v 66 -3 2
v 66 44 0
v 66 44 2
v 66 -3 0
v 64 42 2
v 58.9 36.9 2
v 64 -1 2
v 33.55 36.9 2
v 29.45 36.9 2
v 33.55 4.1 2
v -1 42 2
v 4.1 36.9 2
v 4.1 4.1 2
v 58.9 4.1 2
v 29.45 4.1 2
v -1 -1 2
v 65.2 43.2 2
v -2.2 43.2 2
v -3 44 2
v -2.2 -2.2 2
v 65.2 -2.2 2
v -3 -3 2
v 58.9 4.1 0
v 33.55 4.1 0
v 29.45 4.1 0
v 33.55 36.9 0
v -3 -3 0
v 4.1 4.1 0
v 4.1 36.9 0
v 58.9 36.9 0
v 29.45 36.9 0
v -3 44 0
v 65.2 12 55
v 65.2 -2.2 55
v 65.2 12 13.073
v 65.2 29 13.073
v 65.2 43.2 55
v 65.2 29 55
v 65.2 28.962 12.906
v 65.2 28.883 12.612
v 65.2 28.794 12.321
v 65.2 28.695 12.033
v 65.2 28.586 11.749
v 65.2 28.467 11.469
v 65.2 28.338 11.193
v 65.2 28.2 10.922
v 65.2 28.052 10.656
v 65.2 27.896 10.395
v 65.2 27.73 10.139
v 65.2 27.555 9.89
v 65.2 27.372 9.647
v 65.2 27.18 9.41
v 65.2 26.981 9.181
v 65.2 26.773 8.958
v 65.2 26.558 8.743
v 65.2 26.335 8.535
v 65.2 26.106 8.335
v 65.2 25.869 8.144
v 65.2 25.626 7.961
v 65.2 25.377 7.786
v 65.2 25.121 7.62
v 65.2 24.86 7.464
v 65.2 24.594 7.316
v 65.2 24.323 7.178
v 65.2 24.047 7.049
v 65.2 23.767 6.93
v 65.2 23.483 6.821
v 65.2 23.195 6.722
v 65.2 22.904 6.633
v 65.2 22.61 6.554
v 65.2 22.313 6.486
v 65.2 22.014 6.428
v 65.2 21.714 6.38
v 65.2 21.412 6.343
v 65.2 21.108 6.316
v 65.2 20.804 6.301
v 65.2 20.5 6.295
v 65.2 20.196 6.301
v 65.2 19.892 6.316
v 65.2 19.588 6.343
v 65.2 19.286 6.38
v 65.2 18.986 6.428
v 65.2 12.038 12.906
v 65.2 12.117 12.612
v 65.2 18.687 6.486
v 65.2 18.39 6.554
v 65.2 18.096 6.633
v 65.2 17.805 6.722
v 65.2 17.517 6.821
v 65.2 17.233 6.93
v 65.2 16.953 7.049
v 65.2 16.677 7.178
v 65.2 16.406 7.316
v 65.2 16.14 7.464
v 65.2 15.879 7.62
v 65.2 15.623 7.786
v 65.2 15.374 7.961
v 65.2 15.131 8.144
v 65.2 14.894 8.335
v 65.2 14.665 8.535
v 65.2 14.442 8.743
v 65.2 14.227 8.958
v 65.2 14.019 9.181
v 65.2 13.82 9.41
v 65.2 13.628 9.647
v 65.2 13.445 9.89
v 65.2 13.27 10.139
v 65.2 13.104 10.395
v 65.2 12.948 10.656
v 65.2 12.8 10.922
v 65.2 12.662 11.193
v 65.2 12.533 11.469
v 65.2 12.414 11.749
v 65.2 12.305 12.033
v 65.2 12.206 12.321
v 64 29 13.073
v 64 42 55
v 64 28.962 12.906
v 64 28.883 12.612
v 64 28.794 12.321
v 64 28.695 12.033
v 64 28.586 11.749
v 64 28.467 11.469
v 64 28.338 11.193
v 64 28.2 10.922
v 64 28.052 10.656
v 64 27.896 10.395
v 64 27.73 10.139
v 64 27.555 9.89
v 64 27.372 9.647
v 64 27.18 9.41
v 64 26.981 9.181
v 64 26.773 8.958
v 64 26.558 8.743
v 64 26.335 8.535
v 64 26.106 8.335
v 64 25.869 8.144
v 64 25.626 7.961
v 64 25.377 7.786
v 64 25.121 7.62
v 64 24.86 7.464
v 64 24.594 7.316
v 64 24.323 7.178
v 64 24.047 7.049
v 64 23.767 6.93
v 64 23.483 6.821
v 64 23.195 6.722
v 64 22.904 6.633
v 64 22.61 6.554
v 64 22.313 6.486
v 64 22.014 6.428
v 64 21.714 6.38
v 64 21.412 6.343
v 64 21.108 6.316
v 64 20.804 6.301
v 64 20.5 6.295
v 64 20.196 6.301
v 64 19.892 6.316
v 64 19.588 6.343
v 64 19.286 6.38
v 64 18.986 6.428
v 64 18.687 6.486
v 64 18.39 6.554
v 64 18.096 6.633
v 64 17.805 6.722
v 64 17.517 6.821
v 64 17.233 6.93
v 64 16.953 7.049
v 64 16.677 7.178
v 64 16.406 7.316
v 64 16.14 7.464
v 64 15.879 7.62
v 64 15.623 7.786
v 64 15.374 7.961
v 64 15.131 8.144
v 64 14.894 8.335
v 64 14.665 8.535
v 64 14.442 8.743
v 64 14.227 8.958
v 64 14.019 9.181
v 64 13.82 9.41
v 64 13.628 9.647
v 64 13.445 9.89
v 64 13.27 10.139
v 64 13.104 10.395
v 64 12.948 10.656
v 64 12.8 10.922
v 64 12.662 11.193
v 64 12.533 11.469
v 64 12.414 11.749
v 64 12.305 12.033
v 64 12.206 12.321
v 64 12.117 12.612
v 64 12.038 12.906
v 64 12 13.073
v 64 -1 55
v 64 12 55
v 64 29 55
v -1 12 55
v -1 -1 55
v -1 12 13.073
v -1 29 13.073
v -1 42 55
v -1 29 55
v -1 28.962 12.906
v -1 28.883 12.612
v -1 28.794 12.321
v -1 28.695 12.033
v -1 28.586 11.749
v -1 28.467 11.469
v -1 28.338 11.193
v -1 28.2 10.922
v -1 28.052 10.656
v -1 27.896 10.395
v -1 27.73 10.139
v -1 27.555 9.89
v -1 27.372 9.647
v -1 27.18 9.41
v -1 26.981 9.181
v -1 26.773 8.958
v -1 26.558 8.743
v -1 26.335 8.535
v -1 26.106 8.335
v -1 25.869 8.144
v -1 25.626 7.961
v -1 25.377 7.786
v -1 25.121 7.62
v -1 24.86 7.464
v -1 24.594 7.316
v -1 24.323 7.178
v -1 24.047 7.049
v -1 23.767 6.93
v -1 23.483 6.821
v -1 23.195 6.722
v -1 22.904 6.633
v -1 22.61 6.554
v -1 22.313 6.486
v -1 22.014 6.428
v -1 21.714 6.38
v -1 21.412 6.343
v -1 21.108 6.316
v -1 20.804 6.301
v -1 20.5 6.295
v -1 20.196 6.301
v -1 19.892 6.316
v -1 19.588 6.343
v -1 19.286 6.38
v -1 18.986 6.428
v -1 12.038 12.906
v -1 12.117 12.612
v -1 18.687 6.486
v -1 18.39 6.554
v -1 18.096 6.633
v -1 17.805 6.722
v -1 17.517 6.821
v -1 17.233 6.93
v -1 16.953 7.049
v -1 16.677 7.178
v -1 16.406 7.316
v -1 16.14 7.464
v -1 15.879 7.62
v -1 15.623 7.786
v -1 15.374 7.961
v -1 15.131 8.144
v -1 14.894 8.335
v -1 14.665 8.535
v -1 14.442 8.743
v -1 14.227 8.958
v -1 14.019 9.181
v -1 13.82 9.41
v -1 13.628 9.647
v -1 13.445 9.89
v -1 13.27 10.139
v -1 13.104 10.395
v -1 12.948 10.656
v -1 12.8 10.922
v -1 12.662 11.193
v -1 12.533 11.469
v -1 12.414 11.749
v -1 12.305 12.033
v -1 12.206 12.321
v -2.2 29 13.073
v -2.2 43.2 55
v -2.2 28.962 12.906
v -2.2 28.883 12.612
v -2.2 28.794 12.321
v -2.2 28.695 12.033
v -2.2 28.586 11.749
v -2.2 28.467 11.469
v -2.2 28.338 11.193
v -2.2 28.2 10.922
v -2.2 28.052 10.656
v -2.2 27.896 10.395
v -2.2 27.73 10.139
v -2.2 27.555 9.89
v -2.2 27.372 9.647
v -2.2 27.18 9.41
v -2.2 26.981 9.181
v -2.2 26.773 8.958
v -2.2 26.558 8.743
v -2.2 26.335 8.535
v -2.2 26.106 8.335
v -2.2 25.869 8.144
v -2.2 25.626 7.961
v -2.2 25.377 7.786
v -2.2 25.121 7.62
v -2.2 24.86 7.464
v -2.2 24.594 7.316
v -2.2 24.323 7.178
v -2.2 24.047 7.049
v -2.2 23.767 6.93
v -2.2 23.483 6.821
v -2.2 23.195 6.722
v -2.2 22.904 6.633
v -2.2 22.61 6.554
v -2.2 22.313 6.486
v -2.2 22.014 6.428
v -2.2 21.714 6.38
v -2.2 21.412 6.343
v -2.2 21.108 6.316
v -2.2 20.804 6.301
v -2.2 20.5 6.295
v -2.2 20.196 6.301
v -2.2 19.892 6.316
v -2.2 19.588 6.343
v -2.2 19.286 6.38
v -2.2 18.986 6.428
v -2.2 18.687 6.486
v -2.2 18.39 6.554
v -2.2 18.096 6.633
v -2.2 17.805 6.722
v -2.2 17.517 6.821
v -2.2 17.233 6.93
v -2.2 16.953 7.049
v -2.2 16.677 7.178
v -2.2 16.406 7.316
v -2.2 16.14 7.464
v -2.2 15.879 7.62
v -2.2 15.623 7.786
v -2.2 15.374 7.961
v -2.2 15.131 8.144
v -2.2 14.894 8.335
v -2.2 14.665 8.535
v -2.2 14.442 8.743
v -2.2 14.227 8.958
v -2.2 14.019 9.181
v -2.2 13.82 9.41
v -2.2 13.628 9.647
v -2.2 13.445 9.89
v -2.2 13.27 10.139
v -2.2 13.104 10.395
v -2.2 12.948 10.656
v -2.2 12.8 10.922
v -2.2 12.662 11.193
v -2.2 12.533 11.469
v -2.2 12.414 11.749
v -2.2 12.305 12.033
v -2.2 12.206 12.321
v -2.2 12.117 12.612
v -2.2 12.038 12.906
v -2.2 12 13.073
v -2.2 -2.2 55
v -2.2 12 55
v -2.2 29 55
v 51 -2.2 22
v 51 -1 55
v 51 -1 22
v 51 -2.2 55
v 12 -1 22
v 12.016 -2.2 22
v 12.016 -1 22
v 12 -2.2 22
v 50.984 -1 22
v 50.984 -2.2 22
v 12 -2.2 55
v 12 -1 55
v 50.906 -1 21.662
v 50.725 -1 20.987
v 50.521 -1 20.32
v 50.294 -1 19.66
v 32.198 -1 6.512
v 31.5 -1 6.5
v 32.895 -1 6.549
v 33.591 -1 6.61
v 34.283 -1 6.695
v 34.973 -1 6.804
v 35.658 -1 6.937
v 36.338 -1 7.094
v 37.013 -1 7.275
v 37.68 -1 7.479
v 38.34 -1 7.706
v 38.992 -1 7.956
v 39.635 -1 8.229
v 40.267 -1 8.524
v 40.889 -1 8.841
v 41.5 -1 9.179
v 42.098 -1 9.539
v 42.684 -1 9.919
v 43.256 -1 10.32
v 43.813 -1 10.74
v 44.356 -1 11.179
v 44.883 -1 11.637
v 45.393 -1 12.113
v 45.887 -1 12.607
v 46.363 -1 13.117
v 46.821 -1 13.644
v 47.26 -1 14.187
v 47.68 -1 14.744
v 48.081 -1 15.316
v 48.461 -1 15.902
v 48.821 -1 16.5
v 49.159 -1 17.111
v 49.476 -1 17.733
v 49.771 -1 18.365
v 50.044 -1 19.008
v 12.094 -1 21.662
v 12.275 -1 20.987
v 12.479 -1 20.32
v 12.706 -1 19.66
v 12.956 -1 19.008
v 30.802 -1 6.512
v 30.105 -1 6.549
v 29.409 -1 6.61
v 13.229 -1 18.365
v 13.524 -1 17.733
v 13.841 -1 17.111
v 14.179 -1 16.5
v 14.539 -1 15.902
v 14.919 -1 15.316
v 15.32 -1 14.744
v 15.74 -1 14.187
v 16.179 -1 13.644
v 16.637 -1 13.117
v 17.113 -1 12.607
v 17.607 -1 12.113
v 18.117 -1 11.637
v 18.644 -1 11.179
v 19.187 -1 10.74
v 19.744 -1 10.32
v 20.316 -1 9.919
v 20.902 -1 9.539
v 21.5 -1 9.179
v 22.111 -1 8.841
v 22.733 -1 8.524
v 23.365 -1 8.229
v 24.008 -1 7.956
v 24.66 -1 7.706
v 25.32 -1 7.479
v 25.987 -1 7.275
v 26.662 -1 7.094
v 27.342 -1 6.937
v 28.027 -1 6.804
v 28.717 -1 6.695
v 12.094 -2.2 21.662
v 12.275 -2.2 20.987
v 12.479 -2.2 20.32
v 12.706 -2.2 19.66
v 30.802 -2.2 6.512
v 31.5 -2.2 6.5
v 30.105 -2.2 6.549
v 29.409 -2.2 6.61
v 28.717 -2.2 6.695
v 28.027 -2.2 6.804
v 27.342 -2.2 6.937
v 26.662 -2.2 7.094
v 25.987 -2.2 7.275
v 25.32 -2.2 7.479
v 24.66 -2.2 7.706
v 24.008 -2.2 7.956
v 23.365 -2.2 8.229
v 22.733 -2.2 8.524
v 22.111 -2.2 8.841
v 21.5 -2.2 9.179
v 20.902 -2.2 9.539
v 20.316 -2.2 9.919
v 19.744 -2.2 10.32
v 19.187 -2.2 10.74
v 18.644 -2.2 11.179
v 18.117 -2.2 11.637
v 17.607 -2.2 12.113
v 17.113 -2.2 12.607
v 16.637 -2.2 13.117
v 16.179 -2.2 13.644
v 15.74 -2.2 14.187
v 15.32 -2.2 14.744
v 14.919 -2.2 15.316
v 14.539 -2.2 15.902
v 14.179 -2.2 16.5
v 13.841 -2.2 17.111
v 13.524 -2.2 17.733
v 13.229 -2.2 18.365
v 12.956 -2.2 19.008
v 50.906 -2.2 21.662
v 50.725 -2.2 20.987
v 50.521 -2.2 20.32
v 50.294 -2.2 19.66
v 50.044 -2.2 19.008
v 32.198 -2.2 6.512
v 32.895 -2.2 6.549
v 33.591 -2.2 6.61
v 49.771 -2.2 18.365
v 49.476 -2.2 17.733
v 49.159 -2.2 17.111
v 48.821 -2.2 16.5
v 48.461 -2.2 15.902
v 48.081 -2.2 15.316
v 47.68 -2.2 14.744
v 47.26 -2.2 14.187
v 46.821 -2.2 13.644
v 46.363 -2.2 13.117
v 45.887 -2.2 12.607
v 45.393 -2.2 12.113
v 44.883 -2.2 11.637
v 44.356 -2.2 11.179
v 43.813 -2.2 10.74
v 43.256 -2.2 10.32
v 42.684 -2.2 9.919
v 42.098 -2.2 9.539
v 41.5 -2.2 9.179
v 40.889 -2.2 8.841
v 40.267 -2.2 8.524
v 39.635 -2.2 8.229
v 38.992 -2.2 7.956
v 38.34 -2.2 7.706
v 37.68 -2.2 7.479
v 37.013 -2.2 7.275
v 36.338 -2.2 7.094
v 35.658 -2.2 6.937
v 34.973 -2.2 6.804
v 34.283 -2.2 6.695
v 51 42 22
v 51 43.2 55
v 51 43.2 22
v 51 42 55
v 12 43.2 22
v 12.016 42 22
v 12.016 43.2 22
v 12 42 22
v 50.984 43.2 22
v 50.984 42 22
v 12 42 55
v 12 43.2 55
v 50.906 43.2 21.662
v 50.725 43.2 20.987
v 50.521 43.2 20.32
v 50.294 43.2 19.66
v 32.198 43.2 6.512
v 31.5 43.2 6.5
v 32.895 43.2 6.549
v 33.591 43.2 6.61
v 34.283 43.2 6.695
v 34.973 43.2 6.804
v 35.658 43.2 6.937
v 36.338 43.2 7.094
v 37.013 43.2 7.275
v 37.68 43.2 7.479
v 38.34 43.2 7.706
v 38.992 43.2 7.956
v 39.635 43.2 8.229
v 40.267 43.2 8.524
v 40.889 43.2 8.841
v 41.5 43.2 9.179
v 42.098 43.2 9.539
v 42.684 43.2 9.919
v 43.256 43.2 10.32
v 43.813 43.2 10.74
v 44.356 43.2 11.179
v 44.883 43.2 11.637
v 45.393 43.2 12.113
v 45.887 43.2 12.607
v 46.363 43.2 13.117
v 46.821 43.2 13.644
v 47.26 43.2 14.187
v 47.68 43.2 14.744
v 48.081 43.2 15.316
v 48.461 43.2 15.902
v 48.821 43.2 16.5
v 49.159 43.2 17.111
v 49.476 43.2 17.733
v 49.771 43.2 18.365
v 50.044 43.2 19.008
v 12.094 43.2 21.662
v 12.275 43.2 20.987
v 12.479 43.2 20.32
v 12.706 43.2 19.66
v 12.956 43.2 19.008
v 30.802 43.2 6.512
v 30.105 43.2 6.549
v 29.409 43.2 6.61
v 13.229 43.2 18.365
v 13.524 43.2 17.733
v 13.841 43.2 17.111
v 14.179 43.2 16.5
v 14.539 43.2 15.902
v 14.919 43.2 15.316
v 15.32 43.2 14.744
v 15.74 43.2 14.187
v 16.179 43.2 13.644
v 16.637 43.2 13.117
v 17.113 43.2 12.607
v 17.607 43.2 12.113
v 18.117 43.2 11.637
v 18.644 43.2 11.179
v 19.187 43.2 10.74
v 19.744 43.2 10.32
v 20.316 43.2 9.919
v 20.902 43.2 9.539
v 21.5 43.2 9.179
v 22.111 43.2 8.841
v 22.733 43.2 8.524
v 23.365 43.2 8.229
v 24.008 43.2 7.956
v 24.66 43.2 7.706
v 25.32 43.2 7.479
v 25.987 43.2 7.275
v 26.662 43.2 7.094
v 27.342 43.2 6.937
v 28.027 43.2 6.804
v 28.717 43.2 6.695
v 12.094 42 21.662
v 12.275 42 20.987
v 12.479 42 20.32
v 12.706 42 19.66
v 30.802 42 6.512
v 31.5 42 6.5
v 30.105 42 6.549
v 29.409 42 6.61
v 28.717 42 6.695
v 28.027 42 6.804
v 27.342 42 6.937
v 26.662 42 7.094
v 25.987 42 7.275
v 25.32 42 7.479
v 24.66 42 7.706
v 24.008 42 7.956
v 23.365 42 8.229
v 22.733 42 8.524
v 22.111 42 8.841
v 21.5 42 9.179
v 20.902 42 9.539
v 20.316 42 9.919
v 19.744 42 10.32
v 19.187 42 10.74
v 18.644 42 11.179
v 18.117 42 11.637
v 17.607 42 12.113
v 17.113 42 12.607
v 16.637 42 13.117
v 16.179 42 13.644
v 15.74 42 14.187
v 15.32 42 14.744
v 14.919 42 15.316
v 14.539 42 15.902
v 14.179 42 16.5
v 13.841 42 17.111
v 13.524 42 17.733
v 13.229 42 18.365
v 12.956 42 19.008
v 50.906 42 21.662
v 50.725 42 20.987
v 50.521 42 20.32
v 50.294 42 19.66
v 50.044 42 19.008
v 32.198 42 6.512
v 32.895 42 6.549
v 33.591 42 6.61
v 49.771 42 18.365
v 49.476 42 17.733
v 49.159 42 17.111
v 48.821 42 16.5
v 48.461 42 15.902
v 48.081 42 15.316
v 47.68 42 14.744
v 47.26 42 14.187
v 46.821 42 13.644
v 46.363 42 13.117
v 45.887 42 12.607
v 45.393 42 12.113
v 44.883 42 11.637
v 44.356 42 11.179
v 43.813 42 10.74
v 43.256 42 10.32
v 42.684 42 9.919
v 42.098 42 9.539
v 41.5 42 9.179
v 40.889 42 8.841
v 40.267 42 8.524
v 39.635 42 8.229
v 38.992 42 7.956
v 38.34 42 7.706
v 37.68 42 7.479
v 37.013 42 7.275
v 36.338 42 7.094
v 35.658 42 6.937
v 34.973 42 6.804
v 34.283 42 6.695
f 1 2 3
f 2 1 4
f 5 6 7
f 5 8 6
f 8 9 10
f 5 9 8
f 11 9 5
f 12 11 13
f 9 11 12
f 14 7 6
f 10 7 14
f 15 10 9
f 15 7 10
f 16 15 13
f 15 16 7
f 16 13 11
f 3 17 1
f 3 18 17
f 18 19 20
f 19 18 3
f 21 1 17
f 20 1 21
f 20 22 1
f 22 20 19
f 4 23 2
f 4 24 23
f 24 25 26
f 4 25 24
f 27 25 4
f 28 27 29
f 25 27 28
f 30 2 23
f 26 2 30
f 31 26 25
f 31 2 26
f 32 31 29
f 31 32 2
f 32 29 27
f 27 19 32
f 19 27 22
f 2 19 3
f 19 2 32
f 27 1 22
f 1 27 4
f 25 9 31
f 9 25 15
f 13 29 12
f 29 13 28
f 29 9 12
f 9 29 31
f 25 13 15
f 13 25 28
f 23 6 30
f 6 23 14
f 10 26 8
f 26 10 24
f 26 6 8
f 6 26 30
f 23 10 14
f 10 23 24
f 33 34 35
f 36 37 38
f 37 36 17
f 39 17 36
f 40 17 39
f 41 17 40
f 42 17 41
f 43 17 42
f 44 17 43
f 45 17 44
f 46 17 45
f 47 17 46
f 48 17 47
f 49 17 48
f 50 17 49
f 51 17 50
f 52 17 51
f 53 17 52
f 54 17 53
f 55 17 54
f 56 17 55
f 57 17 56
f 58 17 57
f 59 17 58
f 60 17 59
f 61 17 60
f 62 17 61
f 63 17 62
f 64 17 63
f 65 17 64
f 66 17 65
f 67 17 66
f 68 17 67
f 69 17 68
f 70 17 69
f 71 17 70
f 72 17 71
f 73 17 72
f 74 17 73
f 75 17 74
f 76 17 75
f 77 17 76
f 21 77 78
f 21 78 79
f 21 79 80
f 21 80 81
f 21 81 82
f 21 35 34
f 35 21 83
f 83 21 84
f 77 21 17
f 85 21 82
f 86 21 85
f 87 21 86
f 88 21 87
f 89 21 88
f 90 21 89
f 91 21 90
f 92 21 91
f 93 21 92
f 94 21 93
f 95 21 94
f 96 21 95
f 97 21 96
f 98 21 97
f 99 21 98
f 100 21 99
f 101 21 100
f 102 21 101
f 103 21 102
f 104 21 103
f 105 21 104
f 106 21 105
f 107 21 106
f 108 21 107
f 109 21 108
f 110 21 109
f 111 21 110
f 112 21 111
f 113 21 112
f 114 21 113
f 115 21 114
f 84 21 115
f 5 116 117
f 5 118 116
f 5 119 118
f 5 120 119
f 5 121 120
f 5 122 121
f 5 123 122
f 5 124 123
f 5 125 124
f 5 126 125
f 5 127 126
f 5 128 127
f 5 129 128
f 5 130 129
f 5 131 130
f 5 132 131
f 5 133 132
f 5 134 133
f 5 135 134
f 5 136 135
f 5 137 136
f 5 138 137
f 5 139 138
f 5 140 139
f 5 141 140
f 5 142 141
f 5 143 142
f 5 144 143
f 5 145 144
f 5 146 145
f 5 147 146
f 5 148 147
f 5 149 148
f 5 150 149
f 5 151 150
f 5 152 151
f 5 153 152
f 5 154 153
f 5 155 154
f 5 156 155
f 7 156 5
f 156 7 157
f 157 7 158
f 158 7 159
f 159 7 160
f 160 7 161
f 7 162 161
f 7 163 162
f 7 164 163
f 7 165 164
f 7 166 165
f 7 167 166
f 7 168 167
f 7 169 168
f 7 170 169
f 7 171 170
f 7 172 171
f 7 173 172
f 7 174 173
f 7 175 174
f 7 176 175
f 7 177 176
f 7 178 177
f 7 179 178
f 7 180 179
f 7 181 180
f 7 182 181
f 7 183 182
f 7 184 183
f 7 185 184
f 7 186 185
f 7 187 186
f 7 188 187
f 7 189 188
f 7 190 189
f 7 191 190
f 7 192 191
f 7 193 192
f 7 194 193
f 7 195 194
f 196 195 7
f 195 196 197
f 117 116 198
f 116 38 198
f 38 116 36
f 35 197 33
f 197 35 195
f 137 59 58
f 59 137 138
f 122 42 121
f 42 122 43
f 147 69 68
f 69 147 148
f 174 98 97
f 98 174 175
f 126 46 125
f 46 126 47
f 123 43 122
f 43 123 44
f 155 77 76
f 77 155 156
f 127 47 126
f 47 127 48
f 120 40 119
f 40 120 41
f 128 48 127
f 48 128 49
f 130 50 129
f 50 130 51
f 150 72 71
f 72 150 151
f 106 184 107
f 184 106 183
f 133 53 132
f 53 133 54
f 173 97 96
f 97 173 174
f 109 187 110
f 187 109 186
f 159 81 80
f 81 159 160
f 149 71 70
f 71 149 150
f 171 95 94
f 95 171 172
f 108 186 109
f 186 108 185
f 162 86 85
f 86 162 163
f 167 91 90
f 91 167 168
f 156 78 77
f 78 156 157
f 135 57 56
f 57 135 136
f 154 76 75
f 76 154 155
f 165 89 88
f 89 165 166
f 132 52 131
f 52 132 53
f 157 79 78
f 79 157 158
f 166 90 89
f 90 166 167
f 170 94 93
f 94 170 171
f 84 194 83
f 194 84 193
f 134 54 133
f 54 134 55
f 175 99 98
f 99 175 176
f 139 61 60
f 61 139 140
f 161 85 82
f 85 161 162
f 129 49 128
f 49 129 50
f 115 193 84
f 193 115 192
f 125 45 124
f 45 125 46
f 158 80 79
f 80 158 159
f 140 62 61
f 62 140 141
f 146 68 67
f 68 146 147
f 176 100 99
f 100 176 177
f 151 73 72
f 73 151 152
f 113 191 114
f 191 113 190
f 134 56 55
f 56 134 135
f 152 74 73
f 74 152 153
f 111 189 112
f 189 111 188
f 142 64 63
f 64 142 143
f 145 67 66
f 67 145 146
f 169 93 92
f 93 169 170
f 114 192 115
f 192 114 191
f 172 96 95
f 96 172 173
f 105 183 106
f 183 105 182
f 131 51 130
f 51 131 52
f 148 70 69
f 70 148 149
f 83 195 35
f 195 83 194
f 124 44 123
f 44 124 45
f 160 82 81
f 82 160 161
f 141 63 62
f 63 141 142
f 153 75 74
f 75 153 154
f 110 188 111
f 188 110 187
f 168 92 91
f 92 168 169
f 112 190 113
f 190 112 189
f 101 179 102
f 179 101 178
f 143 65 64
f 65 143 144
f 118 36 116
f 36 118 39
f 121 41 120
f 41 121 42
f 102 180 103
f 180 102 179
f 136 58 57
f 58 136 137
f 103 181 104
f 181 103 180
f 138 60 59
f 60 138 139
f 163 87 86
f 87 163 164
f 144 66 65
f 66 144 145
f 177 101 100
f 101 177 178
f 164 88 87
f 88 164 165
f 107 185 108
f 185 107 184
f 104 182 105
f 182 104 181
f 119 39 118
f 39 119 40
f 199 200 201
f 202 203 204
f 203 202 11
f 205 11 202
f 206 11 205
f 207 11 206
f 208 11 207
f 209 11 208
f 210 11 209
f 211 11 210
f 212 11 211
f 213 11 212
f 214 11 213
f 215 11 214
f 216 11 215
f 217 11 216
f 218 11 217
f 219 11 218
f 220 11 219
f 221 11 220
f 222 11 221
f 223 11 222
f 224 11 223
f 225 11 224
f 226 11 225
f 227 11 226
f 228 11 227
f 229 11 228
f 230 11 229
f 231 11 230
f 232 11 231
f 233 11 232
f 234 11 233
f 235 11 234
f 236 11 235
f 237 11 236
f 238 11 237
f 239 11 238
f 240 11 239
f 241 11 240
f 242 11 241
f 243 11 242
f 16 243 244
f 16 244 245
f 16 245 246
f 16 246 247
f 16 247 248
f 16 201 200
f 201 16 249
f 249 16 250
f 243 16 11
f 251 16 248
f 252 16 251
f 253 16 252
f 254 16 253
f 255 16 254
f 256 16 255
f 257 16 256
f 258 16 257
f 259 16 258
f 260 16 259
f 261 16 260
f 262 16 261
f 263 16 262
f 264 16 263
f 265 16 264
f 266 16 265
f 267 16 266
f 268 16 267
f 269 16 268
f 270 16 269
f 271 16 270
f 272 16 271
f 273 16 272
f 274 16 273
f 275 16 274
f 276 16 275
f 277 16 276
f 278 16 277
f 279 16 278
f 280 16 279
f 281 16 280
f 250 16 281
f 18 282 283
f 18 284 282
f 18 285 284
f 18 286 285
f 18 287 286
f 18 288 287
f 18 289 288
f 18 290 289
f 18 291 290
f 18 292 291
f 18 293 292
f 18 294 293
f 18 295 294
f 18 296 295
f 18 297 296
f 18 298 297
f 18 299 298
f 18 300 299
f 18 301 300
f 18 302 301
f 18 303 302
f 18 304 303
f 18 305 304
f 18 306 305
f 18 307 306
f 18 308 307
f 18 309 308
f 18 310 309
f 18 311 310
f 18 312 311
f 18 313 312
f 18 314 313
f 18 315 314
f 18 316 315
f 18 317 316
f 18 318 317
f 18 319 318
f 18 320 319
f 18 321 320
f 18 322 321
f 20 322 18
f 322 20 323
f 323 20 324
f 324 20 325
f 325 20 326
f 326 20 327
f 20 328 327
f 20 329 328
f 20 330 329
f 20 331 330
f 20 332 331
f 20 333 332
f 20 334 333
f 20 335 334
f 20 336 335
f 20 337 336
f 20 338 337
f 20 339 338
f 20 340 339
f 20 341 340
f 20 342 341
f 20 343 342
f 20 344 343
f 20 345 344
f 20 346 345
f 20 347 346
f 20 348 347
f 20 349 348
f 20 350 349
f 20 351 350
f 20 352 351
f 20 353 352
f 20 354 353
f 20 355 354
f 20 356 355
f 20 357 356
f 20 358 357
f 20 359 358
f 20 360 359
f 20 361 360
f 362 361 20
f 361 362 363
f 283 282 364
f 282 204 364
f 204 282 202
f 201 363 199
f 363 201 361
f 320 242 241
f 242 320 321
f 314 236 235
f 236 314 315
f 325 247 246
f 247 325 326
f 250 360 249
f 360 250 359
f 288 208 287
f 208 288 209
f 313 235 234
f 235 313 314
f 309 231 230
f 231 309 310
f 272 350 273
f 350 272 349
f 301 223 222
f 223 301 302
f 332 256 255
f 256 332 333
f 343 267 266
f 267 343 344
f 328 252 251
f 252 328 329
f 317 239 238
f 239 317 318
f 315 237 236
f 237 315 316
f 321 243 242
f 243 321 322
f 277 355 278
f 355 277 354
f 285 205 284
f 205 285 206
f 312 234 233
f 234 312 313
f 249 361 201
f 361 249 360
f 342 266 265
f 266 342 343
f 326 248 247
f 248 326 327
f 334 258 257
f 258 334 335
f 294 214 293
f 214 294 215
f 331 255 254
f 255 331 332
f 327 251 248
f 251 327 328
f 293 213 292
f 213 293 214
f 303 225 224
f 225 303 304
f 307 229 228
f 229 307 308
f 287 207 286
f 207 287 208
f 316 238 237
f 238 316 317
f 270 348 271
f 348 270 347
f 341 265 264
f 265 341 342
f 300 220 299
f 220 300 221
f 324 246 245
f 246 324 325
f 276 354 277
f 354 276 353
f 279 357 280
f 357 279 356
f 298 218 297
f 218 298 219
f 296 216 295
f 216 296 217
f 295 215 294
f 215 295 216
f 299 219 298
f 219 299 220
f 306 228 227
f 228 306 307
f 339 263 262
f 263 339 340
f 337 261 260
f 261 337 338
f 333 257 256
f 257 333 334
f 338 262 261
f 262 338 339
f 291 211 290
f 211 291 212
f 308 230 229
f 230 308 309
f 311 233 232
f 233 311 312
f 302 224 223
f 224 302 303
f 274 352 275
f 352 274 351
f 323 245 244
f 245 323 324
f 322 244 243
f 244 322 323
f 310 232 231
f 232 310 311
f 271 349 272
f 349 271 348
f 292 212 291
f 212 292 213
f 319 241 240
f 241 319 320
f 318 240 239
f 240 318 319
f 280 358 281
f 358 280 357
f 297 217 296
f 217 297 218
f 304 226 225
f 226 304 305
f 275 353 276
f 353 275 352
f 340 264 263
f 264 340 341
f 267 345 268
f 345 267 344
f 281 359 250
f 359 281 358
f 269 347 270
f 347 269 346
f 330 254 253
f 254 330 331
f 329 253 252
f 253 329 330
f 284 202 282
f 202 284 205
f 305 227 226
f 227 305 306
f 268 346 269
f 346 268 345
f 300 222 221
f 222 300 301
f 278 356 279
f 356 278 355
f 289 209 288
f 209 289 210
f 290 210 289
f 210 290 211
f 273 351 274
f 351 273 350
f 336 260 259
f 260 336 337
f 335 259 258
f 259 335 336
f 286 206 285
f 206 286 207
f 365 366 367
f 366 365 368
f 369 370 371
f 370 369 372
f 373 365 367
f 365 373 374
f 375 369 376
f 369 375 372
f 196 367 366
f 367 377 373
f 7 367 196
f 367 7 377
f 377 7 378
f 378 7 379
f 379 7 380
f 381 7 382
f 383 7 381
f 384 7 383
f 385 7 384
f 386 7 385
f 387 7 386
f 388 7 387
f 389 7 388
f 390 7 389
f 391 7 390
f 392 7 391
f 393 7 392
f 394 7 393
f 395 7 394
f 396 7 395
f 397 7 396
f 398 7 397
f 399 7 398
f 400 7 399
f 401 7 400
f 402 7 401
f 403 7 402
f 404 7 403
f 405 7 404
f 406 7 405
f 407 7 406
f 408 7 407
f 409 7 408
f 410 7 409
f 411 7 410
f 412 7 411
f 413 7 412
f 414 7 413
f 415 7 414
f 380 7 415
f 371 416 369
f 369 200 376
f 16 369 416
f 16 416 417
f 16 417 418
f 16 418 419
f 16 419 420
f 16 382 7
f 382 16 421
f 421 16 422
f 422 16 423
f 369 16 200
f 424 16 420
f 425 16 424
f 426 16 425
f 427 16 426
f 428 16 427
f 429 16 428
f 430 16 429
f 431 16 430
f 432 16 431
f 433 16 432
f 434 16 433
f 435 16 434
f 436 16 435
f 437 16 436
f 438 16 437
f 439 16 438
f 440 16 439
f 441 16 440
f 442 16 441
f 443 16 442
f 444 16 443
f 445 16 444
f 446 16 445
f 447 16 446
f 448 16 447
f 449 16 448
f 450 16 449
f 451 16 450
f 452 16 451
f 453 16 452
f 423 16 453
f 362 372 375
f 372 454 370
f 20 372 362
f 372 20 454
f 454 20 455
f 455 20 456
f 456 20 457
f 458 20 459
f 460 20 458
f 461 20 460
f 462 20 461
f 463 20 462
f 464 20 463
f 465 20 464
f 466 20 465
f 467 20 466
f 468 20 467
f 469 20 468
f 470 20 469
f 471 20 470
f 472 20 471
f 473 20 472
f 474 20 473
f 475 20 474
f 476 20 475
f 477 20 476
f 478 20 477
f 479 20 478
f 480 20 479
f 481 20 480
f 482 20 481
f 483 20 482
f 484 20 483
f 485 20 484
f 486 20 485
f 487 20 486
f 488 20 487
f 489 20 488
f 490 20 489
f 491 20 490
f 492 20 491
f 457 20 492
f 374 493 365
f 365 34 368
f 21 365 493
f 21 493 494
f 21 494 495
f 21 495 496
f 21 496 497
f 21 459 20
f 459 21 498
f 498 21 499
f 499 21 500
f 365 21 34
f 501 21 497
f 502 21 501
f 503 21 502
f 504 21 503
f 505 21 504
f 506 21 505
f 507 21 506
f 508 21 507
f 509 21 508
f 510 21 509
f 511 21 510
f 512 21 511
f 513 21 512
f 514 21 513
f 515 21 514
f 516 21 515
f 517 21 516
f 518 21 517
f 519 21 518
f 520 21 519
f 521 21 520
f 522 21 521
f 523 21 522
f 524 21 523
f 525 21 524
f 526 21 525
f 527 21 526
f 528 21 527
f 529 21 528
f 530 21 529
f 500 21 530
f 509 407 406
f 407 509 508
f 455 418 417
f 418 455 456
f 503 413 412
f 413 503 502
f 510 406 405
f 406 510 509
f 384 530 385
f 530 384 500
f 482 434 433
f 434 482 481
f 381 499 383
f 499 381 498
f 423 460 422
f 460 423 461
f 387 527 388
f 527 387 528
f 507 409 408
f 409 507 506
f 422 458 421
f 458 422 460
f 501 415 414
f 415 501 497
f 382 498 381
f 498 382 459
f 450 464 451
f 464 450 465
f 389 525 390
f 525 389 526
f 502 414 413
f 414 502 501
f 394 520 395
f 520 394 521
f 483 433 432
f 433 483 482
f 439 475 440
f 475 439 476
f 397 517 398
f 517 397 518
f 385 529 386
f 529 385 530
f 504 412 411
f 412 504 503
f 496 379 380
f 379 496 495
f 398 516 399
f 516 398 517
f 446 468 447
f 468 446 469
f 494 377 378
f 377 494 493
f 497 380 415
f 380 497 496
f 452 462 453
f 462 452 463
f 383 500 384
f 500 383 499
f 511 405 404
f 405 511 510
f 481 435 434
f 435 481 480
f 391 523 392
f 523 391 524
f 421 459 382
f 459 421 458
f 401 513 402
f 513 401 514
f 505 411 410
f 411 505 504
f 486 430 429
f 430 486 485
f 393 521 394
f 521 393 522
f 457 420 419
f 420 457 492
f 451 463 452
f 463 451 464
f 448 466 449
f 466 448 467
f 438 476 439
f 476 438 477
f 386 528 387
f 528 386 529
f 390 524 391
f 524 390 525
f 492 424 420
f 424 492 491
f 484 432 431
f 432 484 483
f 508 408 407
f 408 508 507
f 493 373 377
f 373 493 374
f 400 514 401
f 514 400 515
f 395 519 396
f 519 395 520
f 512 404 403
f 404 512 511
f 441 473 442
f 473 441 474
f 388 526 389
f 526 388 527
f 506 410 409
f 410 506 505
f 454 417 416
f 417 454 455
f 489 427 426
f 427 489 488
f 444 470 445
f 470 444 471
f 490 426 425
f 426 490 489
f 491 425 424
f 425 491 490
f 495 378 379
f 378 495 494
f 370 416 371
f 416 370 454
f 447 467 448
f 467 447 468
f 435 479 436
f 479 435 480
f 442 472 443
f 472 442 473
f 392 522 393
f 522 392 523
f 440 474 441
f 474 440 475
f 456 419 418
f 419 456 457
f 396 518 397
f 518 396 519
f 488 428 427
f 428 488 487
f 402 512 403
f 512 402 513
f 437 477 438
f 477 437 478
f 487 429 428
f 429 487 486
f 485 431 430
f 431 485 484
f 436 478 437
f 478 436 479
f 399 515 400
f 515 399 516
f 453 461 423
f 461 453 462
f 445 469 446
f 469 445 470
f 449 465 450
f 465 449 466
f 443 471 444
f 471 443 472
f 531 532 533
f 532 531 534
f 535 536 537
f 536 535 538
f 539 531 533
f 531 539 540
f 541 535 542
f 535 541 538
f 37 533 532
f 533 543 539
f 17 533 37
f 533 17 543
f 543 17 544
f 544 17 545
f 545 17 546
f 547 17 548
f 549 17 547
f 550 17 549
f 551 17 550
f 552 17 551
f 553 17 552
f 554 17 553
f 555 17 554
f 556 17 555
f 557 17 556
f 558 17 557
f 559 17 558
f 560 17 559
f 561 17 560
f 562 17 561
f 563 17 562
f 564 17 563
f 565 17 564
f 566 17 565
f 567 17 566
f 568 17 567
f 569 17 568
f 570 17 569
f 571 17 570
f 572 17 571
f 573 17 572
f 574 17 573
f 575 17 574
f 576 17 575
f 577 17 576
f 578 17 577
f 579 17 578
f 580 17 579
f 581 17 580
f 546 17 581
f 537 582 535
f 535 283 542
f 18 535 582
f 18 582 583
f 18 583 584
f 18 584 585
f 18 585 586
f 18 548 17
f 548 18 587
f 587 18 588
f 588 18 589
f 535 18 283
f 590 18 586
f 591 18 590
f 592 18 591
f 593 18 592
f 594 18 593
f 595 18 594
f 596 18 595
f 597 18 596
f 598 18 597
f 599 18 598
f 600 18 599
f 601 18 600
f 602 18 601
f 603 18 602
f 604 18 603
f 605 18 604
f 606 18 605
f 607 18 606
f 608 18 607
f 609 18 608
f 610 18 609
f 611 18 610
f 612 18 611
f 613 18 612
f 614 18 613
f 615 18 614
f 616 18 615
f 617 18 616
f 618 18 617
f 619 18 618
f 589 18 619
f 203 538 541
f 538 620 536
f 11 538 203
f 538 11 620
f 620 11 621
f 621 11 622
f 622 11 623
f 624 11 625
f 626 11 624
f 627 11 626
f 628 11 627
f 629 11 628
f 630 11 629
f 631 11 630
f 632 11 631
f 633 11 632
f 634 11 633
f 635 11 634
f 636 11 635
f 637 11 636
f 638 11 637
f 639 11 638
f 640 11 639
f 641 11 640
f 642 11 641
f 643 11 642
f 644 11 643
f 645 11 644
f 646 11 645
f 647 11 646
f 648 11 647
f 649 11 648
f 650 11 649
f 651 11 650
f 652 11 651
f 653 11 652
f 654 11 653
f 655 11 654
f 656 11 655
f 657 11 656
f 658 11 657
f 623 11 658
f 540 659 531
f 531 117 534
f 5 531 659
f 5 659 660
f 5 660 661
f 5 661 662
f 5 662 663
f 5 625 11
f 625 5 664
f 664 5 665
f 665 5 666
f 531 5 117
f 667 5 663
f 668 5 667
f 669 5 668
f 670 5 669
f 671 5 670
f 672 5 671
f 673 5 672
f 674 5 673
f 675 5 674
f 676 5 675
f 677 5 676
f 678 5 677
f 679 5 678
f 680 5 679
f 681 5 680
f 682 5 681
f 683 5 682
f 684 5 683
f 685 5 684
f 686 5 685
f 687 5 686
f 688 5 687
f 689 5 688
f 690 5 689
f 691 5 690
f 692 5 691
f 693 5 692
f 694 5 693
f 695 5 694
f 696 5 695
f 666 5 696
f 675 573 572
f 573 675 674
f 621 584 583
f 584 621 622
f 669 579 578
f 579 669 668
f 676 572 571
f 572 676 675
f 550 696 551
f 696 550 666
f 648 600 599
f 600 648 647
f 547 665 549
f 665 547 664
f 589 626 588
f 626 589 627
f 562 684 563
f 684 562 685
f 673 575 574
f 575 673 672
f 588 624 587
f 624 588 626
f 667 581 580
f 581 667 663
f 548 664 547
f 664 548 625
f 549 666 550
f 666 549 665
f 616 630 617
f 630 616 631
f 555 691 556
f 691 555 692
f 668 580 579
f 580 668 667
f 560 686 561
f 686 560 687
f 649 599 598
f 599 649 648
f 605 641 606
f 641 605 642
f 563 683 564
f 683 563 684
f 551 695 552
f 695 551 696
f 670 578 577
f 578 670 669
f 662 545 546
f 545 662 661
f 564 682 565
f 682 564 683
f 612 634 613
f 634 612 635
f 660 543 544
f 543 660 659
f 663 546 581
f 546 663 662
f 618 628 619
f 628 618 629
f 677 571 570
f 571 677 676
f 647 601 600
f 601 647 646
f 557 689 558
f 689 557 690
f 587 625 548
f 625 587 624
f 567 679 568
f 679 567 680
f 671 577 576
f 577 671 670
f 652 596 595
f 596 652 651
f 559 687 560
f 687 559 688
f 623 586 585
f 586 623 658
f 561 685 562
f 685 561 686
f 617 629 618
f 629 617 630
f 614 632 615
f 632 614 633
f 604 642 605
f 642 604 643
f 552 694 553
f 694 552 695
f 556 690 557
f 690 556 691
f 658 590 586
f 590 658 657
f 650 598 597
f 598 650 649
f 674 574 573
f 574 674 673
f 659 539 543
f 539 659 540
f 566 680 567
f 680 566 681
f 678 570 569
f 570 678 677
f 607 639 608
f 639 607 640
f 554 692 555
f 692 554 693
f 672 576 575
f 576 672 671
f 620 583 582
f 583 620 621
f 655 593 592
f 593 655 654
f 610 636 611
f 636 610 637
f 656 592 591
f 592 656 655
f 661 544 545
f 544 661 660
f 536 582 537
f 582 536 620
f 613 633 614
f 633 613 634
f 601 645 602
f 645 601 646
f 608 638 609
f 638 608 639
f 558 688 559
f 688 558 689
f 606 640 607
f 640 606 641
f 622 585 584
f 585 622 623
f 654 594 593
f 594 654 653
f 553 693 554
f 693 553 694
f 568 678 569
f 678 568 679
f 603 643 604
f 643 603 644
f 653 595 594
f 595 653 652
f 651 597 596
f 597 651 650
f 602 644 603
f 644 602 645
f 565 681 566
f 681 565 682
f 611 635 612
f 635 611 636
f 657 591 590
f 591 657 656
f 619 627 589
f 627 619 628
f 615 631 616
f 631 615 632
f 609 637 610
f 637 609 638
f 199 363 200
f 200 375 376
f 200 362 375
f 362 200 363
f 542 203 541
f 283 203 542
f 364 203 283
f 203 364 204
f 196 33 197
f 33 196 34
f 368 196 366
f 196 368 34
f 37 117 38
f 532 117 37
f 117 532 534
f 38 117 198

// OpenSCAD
// Card Holder

// Card Length
CardLength = 63;

// Card Width
CardWidth = 41;

// Tolerance
Tolerance = 1;

// Size Of Nozzle
SizeOfNozzle = 0.4;

// Outside Skirt
OutsideSkirt = 2;

// Wall Thickness In Layers
WallThicknessInLayers = 3;

// Wall Height
WallHeight = 53;

// Wall Length
WallLength = 13;

// BottomThickness
BottomThickness = 2;

// Cut Out Percentage
CutOutPercentage = 80;

// Length Support
SupportHeight = 20;
HoleRadiusChange = 0.5;
HoleOffset = 4.5;

// Width Support (change Length Support first!)
WidthRadiusChange = 0.67; // percentage as a fraction
WidthOffset = -4.5;
WidthHeightChange = -7;



WallThickness = WallThicknessInLayers * SizeOfNozzle;
Rim = CardWidth * ((100 - CutOutPercentage) / 2) / 100;
CutOutLength = (CardLength - 3 * Rim) / 2;
CutOutWidth = CardWidth * CutOutPercentage / 100;
HoleRadius = (CardLength - 2 * WallLength + 2* Tolerance)/2 + HoleRadiusChange;
WidthRatio = CardWidth/CardLength;



// Bottom Layer
difference(){
	translate([	0 - Tolerance - OutsideSkirt,
					0 - Tolerance - OutsideSkirt,
					0])
	cube(size = [	CardLength + 2 * (Tolerance + OutsideSkirt),
						CardWidth + 2 * (Tolerance + OutsideSkirt),
						BottomThickness]);

	// Cut Out
	translate([	0 + Rim,0 + Rim,0])
	cube(size = [	CutOutLength,
						CutOutWidth,
						BottomThickness]);

	translate([	0 + 2 * Rim + CutOutLength,0 + Rim,0])
	cube(size = [	CutOutLength,
						CutOutWidth,
						BottomThickness]);

}


// Walls(LL)

	translate([	0 - Tolerance - WallThickness,
					0 - Tolerance - WallThickness,
				   BottomThickness])
	cube(size = [	WallThickness,
						WallThickness + WallLength,
						WallHeight]);

	translate([	0 - Tolerance - WallThickness,
					0 - Tolerance - WallThickness,
				   BottomThickness])
	cube(size = [	WallThickness + WallLength,
						WallThickness,
						WallHeight]);


// Walls(UL)

	translate([	0 - Tolerance - WallThickness,
					CardWidth + Tolerance - WallLength,
				   BottomThickness])
	cube(size = [	WallThickness,
						WallThickness + WallLength,
						WallHeight]);

	translate([	0 - Tolerance - WallThickness,
					CardWidth + Tolerance,
				   BottomThickness])
	cube(size = [	WallThickness + WallLength,
						WallThickness,
						WallHeight]);
    
    
// Walls(LR)

	translate([	CardLength + Tolerance - WallLength,
					0 - Tolerance - WallThickness,
				   BottomThickness])
	cube(size = [	WallThickness + WallLength,
						WallThickness,
						WallHeight]);

	translate([	CardLength + Tolerance,
					0 - Tolerance - WallThickness,
				   BottomThickness])
	cube(size = [	WallThickness,
						WallThickness + WallLength,
						WallHeight]);

// Walls(UR)

	translate([	CardLength + Tolerance - WallLength,
					CardWidth + Tolerance,
				   BottomThickness])
	cube(size = [	WallThickness + WallLength,
						WallThickness,
						WallHeight]);

	translate([	CardLength + Tolerance,
					CardWidth + Tolerance - WallLength,
				   BottomThickness])
	cube(size = [	WallThickness,
						WallThickness + WallLength,
						WallHeight]);
                        
 // Width Support

    difference() {    
        translate([	CardLength + Tolerance, WallLength - Tolerance, BottomThickness]) cube(size = [WallThickness, CardWidth+2*Tolerance-2*WallLength, SupportHeight+WidthHeightChange]);
        translate([CardLength + Tolerance, (CardWidth)/2, (SupportHeight*WidthRatio+BottomThickness+HoleOffset)+WidthOffset]) rotate([0, 90, 0]) cylinder($fn=180, WallThickness, HoleRadius*WidthRatio*WidthRadiusChange, HoleRadius*WidthRatio*WidthRadiusChange, false);
    }
    
    difference() {    
        translate([	0 - WallThickness - Tolerance, WallLength - Tolerance, BottomThickness]) cube(size = [WallThickness, CardWidth+2*Tolerance-2*WallLength, SupportHeight+WidthHeightChange]);
        translate([0 - WallThickness - Tolerance, (CardWidth)/2, (SupportHeight*WidthRatio+BottomThickness+HoleOffset)+WidthOffset]) rotate([0, 90, 0]) cylinder($fn=180, WallThickness, HoleRadius*WidthRatio*WidthRadiusChange, HoleRadius*WidthRatio*WidthRadiusChange, false);
    }
                        
// Length Support
    
    difference() {    
        translate([	WallLength - Tolerance, 0 - Tolerance - WallThickness, BottomThickness]) cube(size = [CardLength - 2 * WallLength + 2* Tolerance, WallThickness, SupportHeight]);
        translate([CardLength/2, 0-Tolerance, SupportHeight+BottomThickness+HoleOffset]) rotate([90, 0, 0]) cylinder($fn=180, WallThickness, HoleRadius, HoleRadius, false);
    }
    
    difference() {    
        translate([	WallLength - Tolerance, CardWidth+Tolerance, BottomThickness]) cube(size = [CardLength - 2 * WallLength + 2* Tolerance, WallThickness, SupportHeight]);
        translate([CardLength/2, CardWidth+Tolerance+WallThickness, SupportHeight+BottomThickness+HoleOffset]) rotate([90, 0, 0]) cylinder($fn=180, WallThickness, HoleRadius, HoleRadius, false);
    }
